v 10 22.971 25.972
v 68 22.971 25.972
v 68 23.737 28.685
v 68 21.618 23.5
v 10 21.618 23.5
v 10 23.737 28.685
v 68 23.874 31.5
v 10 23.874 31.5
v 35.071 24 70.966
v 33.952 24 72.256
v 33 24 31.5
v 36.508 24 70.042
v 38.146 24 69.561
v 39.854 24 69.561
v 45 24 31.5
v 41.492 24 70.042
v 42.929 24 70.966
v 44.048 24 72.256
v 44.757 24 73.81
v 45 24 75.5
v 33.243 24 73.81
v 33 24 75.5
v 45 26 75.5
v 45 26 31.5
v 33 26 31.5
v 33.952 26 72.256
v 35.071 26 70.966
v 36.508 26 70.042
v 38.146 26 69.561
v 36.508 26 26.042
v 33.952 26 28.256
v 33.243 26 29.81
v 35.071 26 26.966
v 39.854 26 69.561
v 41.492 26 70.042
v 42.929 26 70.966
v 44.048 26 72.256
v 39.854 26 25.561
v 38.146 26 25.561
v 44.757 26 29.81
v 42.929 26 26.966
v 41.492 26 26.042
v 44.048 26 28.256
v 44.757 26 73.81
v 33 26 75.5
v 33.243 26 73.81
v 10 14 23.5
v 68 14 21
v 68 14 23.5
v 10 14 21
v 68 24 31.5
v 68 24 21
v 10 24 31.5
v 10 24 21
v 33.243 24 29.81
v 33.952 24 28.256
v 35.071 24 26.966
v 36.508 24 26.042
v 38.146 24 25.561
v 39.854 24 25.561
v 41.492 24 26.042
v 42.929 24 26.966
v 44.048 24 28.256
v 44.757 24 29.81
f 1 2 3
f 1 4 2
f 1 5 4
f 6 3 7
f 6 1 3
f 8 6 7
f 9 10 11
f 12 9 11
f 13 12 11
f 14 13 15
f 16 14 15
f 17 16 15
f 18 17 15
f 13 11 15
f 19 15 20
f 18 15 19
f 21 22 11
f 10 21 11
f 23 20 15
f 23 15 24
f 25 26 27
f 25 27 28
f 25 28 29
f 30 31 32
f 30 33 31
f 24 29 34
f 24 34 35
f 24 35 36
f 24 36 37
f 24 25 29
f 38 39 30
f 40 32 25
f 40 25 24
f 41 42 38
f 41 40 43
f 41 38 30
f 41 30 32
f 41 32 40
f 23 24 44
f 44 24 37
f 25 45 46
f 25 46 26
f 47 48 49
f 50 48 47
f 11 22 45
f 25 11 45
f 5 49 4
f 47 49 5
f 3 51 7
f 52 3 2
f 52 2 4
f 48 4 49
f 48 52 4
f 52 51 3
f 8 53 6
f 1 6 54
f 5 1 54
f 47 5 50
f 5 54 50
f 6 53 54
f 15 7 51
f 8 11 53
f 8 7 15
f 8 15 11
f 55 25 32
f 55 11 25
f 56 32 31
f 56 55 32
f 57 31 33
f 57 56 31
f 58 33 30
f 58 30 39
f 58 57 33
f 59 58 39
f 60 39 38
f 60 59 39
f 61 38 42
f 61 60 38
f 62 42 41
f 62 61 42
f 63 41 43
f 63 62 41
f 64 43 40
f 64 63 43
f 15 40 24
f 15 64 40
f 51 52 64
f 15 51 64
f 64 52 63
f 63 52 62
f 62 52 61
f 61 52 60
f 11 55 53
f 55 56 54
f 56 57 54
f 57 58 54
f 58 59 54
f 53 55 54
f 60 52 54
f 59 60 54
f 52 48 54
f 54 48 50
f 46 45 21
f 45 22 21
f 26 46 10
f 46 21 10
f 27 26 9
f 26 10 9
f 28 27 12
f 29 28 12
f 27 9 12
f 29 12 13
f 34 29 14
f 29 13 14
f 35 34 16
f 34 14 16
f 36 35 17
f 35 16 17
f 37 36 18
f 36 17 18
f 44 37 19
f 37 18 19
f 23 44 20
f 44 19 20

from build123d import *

# Parameters (mm, degrees)
BOX070_W          = 58
BOX070_H          = 10
BOX070_DEPTH      = 2.5
CYLINDER109_R     = 12.5
CYLINDER109_DEPTH = 78
BOX071_W          = 58
BOX071_H          = 10
BOX071_DEPTH      = 10.5
CYLINDER107_W     = 6
CYLINDER107_H     = 2
CYLINDER107_ANGLE = 180
BOX069_W          = 12
BOX069_H          = 2
BOX069_DEPTH      = 44
CYLINDER108_W     = 6
CYLINDER108_H     = 2
CYLINDER108_ANGLE = 180


with BuildPart() as cube059:
    # Box070 → Box070 (new body)
    with BuildSketch(Plane(origin=(68, 24, 21), x_dir=(-1, 0, 0), z_dir=(0, 0, 1))):
        with Locations((29, 5)):
            Rectangle(BOX070_W, BOX070_H)
    extrude(amount=BOX070_DEPTH)


with BuildPart() as cylinder109:
    # Cylinder109 → Cylinder109 (new body)
    with BuildSketch(Plane(origin=(0, 11.4, 30.7), x_dir=(0, 0, -1), z_dir=(1, 0, 0))):
        Circle(CYLINDER109_R)
    extrude(amount=CYLINDER109_DEPTH)


with BuildPart() as fusion042:
    # Box071 → Box071 (new body)
    with BuildSketch(Plane(origin=(68, 24, 21), x_dir=(-1, 0, 0), z_dir=(0, 0, 1))):
        with Locations((29, 5)):
            Rectangle(BOX071_W, BOX071_H)
    extrude(amount=BOX071_DEPTH)

    # Cut056: cut Cylinder109
    add(cylinder109.part, mode=Mode.SUBTRACT)

    # Fusion042: union Cube059
    add(cube059.part)


with BuildPart() as cylinder107:
    # Cylinder107 → Cylinder107 (revolve)
    with BuildSketch(Plane(origin=(39, 26, 75.5), x_dir=(-1, 0, 0), z_dir=(0, 0, 1))):
        with Locations((3, 1)):
            Rectangle(CYLINDER107_W, CYLINDER107_H)
    revolve(axis=Axis((39, 26, 75.5), (0, -1, 0)), revolution_arc=CYLINDER107_ANGLE)


with BuildPart() as cut055:
    # Box069 → Box069 (new body)
    with BuildSketch(Plane(origin=(33, 24, 31.5), x_dir=(1, 0, 0), z_dir=(0, 0, 1))):
        with Locations((6, 1)):
            Rectangle(BOX069_W, BOX069_H)
    extrude(amount=BOX069_DEPTH)

    # Cut055: cut Cylinder107
    add(cylinder107.part, mode=Mode.SUBTRACT)


with BuildPart() as batteryhold001:
    # Cylinder108 → Cylinder108 (revolve)
    with BuildSketch(Plane(origin=(39, 26, 31.5), x_dir=(-1, 0, 0), z_dir=(0, 0, 1))):
        with Locations((3, 1)):
            Rectangle(CYLINDER108_W, CYLINDER108_H)
    revolve(axis=Axis((39, 26, 31.5), (0, -1, 0)), revolution_arc=CYLINDER108_ANGLE)

    # Fusion041: union Cut055
    add(cut055.part)

    # Fusion043: union Fusion042
    add(fusion042.part)


solid = batteryhold001.part
